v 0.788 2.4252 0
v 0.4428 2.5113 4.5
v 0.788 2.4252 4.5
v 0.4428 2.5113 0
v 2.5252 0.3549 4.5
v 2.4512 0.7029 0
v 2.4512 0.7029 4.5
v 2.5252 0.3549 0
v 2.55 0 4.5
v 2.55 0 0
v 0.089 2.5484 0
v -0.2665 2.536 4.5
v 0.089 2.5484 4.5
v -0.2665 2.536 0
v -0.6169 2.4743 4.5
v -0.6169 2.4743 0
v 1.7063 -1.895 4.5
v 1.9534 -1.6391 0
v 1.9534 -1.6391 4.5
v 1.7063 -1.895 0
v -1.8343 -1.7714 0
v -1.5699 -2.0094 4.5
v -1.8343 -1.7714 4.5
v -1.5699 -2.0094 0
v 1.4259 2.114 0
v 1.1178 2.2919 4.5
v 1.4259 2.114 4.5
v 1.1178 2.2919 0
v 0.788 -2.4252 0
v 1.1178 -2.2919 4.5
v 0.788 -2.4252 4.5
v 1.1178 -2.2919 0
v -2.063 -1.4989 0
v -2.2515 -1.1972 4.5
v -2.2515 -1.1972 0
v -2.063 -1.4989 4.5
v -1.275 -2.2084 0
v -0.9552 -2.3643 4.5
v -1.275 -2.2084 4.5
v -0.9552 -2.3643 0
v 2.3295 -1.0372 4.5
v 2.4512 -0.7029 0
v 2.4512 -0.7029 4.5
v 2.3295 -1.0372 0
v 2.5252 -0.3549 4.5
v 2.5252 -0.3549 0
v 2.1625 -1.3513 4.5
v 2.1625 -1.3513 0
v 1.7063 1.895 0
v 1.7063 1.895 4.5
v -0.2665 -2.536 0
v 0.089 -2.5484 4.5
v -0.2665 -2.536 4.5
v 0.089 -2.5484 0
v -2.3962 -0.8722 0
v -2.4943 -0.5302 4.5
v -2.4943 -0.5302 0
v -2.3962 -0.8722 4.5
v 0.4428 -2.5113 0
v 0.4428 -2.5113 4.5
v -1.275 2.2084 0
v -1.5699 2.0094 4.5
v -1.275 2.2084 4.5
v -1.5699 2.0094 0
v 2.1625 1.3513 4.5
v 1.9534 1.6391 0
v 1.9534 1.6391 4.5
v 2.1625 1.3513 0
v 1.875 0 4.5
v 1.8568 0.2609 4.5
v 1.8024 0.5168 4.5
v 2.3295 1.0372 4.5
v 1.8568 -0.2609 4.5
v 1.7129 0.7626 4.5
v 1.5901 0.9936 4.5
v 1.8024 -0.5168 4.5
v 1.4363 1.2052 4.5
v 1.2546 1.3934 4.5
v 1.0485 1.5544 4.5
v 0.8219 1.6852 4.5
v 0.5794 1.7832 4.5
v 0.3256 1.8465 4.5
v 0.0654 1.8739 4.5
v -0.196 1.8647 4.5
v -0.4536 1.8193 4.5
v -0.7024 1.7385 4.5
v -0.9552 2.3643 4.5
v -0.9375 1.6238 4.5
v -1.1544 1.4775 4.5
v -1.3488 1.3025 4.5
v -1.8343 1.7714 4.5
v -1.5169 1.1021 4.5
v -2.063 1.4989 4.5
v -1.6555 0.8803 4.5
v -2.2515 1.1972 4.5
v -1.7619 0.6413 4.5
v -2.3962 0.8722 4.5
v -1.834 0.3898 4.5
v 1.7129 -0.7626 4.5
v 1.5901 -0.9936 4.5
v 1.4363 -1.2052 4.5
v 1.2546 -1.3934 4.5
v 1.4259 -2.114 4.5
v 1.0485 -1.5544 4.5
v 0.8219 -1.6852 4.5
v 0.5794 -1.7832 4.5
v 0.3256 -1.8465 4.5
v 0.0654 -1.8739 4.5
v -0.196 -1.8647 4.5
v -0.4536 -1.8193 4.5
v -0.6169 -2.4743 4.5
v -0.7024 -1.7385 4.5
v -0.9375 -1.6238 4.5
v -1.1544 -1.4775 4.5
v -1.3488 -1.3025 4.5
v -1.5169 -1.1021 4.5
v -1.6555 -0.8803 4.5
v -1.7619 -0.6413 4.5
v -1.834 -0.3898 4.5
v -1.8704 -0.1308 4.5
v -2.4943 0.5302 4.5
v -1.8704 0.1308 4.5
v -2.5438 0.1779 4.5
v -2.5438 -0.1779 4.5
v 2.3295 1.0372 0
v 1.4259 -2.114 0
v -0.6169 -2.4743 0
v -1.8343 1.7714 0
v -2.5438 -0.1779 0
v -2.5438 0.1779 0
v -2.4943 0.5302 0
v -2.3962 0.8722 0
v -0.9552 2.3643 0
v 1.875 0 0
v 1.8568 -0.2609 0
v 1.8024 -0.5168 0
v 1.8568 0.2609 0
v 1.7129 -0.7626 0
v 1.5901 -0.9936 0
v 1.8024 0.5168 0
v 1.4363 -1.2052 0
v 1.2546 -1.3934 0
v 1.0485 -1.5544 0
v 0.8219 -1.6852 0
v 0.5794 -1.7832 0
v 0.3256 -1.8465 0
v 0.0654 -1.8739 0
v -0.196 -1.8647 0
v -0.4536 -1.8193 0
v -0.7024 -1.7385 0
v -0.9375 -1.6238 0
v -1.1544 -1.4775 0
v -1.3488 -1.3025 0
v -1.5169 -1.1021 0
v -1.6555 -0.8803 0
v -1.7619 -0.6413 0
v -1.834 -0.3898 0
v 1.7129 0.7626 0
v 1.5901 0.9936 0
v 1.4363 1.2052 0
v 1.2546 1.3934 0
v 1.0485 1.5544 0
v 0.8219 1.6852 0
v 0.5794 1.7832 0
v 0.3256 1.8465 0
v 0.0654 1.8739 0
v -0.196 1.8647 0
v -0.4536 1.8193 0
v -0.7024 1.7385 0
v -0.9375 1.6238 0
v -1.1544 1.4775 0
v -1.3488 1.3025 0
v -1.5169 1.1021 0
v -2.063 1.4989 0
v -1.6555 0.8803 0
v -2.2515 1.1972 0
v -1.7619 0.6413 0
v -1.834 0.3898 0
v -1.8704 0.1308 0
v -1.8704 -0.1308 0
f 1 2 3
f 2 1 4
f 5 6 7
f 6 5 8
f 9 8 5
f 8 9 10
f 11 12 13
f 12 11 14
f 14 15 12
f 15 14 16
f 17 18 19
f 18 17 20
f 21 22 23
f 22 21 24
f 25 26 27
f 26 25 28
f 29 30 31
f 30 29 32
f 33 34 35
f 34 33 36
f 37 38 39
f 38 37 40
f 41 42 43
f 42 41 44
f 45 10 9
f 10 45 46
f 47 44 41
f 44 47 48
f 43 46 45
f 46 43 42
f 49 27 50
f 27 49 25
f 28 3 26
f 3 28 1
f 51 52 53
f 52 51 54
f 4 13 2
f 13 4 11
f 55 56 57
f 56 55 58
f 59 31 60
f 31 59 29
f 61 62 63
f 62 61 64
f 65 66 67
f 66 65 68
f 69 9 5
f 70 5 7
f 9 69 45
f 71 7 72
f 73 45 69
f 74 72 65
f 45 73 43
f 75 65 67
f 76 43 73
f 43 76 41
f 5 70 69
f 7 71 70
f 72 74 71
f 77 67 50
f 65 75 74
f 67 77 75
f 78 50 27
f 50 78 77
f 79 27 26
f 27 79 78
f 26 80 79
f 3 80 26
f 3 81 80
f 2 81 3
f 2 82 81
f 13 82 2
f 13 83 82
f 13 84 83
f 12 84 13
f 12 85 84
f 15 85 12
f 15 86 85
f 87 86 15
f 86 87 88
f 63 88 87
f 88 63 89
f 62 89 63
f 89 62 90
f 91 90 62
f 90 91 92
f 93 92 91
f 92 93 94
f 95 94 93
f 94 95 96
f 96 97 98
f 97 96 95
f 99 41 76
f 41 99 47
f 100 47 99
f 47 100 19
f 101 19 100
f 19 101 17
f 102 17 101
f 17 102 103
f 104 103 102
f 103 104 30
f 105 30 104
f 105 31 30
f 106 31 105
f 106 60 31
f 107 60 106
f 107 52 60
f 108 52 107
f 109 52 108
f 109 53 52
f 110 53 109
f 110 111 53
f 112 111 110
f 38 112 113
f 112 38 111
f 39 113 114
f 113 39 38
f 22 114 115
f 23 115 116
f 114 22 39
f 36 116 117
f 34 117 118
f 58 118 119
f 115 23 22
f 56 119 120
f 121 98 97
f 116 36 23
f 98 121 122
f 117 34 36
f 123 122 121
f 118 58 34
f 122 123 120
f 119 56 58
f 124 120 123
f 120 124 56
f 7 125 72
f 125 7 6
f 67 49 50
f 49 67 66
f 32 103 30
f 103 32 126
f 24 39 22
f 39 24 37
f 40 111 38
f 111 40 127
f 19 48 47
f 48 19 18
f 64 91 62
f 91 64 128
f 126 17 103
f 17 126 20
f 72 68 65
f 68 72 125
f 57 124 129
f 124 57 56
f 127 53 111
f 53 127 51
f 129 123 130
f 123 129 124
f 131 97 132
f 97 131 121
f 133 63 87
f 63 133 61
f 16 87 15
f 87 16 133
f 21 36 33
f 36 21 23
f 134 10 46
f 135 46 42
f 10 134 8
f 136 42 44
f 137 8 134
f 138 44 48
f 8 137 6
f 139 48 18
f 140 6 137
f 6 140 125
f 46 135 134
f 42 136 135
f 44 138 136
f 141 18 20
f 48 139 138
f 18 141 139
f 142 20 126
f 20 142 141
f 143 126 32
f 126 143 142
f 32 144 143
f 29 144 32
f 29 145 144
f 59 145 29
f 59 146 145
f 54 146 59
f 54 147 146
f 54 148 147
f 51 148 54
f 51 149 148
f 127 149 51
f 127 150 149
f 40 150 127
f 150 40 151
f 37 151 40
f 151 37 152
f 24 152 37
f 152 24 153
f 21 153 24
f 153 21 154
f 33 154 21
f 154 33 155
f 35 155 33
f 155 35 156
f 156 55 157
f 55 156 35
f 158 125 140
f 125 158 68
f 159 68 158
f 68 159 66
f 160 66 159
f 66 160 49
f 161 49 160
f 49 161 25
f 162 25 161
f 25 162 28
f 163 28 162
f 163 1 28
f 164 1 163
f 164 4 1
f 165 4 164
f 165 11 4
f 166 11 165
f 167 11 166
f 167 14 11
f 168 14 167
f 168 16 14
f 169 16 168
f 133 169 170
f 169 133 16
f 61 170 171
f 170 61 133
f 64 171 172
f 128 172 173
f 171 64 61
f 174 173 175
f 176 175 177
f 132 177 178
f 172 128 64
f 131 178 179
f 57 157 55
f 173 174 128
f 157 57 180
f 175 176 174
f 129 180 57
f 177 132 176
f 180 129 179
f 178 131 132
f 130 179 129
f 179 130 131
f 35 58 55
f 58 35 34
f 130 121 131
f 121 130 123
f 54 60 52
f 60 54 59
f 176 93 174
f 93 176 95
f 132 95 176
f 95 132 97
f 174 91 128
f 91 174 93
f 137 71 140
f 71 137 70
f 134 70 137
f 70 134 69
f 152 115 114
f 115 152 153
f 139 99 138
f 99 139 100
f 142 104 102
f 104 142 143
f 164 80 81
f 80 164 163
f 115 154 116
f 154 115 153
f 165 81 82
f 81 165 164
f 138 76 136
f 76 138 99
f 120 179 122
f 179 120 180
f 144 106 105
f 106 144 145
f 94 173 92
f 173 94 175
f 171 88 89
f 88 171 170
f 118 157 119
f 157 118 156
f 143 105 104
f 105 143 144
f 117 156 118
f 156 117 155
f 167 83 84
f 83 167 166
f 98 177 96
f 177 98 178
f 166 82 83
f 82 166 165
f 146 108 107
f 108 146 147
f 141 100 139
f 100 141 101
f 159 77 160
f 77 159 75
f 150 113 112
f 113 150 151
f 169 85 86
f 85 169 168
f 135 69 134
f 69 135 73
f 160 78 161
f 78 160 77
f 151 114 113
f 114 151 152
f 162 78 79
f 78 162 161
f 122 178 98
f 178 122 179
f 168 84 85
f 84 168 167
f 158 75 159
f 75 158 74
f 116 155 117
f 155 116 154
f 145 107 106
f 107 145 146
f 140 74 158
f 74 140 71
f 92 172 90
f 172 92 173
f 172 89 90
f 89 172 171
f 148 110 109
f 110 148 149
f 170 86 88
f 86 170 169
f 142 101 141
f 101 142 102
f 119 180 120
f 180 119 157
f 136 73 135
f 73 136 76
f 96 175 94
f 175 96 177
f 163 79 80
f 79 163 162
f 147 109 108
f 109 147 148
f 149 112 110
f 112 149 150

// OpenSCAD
$fn=45;
//translate([4.75,0,1-1]){
//    import("cl_roller.stl");
//}
difference(){
    cylinder(h=4.5,d=5.1);
    cylinder(h=9,d=3.75);//was cylinder(h=9,d=3.65);
}
